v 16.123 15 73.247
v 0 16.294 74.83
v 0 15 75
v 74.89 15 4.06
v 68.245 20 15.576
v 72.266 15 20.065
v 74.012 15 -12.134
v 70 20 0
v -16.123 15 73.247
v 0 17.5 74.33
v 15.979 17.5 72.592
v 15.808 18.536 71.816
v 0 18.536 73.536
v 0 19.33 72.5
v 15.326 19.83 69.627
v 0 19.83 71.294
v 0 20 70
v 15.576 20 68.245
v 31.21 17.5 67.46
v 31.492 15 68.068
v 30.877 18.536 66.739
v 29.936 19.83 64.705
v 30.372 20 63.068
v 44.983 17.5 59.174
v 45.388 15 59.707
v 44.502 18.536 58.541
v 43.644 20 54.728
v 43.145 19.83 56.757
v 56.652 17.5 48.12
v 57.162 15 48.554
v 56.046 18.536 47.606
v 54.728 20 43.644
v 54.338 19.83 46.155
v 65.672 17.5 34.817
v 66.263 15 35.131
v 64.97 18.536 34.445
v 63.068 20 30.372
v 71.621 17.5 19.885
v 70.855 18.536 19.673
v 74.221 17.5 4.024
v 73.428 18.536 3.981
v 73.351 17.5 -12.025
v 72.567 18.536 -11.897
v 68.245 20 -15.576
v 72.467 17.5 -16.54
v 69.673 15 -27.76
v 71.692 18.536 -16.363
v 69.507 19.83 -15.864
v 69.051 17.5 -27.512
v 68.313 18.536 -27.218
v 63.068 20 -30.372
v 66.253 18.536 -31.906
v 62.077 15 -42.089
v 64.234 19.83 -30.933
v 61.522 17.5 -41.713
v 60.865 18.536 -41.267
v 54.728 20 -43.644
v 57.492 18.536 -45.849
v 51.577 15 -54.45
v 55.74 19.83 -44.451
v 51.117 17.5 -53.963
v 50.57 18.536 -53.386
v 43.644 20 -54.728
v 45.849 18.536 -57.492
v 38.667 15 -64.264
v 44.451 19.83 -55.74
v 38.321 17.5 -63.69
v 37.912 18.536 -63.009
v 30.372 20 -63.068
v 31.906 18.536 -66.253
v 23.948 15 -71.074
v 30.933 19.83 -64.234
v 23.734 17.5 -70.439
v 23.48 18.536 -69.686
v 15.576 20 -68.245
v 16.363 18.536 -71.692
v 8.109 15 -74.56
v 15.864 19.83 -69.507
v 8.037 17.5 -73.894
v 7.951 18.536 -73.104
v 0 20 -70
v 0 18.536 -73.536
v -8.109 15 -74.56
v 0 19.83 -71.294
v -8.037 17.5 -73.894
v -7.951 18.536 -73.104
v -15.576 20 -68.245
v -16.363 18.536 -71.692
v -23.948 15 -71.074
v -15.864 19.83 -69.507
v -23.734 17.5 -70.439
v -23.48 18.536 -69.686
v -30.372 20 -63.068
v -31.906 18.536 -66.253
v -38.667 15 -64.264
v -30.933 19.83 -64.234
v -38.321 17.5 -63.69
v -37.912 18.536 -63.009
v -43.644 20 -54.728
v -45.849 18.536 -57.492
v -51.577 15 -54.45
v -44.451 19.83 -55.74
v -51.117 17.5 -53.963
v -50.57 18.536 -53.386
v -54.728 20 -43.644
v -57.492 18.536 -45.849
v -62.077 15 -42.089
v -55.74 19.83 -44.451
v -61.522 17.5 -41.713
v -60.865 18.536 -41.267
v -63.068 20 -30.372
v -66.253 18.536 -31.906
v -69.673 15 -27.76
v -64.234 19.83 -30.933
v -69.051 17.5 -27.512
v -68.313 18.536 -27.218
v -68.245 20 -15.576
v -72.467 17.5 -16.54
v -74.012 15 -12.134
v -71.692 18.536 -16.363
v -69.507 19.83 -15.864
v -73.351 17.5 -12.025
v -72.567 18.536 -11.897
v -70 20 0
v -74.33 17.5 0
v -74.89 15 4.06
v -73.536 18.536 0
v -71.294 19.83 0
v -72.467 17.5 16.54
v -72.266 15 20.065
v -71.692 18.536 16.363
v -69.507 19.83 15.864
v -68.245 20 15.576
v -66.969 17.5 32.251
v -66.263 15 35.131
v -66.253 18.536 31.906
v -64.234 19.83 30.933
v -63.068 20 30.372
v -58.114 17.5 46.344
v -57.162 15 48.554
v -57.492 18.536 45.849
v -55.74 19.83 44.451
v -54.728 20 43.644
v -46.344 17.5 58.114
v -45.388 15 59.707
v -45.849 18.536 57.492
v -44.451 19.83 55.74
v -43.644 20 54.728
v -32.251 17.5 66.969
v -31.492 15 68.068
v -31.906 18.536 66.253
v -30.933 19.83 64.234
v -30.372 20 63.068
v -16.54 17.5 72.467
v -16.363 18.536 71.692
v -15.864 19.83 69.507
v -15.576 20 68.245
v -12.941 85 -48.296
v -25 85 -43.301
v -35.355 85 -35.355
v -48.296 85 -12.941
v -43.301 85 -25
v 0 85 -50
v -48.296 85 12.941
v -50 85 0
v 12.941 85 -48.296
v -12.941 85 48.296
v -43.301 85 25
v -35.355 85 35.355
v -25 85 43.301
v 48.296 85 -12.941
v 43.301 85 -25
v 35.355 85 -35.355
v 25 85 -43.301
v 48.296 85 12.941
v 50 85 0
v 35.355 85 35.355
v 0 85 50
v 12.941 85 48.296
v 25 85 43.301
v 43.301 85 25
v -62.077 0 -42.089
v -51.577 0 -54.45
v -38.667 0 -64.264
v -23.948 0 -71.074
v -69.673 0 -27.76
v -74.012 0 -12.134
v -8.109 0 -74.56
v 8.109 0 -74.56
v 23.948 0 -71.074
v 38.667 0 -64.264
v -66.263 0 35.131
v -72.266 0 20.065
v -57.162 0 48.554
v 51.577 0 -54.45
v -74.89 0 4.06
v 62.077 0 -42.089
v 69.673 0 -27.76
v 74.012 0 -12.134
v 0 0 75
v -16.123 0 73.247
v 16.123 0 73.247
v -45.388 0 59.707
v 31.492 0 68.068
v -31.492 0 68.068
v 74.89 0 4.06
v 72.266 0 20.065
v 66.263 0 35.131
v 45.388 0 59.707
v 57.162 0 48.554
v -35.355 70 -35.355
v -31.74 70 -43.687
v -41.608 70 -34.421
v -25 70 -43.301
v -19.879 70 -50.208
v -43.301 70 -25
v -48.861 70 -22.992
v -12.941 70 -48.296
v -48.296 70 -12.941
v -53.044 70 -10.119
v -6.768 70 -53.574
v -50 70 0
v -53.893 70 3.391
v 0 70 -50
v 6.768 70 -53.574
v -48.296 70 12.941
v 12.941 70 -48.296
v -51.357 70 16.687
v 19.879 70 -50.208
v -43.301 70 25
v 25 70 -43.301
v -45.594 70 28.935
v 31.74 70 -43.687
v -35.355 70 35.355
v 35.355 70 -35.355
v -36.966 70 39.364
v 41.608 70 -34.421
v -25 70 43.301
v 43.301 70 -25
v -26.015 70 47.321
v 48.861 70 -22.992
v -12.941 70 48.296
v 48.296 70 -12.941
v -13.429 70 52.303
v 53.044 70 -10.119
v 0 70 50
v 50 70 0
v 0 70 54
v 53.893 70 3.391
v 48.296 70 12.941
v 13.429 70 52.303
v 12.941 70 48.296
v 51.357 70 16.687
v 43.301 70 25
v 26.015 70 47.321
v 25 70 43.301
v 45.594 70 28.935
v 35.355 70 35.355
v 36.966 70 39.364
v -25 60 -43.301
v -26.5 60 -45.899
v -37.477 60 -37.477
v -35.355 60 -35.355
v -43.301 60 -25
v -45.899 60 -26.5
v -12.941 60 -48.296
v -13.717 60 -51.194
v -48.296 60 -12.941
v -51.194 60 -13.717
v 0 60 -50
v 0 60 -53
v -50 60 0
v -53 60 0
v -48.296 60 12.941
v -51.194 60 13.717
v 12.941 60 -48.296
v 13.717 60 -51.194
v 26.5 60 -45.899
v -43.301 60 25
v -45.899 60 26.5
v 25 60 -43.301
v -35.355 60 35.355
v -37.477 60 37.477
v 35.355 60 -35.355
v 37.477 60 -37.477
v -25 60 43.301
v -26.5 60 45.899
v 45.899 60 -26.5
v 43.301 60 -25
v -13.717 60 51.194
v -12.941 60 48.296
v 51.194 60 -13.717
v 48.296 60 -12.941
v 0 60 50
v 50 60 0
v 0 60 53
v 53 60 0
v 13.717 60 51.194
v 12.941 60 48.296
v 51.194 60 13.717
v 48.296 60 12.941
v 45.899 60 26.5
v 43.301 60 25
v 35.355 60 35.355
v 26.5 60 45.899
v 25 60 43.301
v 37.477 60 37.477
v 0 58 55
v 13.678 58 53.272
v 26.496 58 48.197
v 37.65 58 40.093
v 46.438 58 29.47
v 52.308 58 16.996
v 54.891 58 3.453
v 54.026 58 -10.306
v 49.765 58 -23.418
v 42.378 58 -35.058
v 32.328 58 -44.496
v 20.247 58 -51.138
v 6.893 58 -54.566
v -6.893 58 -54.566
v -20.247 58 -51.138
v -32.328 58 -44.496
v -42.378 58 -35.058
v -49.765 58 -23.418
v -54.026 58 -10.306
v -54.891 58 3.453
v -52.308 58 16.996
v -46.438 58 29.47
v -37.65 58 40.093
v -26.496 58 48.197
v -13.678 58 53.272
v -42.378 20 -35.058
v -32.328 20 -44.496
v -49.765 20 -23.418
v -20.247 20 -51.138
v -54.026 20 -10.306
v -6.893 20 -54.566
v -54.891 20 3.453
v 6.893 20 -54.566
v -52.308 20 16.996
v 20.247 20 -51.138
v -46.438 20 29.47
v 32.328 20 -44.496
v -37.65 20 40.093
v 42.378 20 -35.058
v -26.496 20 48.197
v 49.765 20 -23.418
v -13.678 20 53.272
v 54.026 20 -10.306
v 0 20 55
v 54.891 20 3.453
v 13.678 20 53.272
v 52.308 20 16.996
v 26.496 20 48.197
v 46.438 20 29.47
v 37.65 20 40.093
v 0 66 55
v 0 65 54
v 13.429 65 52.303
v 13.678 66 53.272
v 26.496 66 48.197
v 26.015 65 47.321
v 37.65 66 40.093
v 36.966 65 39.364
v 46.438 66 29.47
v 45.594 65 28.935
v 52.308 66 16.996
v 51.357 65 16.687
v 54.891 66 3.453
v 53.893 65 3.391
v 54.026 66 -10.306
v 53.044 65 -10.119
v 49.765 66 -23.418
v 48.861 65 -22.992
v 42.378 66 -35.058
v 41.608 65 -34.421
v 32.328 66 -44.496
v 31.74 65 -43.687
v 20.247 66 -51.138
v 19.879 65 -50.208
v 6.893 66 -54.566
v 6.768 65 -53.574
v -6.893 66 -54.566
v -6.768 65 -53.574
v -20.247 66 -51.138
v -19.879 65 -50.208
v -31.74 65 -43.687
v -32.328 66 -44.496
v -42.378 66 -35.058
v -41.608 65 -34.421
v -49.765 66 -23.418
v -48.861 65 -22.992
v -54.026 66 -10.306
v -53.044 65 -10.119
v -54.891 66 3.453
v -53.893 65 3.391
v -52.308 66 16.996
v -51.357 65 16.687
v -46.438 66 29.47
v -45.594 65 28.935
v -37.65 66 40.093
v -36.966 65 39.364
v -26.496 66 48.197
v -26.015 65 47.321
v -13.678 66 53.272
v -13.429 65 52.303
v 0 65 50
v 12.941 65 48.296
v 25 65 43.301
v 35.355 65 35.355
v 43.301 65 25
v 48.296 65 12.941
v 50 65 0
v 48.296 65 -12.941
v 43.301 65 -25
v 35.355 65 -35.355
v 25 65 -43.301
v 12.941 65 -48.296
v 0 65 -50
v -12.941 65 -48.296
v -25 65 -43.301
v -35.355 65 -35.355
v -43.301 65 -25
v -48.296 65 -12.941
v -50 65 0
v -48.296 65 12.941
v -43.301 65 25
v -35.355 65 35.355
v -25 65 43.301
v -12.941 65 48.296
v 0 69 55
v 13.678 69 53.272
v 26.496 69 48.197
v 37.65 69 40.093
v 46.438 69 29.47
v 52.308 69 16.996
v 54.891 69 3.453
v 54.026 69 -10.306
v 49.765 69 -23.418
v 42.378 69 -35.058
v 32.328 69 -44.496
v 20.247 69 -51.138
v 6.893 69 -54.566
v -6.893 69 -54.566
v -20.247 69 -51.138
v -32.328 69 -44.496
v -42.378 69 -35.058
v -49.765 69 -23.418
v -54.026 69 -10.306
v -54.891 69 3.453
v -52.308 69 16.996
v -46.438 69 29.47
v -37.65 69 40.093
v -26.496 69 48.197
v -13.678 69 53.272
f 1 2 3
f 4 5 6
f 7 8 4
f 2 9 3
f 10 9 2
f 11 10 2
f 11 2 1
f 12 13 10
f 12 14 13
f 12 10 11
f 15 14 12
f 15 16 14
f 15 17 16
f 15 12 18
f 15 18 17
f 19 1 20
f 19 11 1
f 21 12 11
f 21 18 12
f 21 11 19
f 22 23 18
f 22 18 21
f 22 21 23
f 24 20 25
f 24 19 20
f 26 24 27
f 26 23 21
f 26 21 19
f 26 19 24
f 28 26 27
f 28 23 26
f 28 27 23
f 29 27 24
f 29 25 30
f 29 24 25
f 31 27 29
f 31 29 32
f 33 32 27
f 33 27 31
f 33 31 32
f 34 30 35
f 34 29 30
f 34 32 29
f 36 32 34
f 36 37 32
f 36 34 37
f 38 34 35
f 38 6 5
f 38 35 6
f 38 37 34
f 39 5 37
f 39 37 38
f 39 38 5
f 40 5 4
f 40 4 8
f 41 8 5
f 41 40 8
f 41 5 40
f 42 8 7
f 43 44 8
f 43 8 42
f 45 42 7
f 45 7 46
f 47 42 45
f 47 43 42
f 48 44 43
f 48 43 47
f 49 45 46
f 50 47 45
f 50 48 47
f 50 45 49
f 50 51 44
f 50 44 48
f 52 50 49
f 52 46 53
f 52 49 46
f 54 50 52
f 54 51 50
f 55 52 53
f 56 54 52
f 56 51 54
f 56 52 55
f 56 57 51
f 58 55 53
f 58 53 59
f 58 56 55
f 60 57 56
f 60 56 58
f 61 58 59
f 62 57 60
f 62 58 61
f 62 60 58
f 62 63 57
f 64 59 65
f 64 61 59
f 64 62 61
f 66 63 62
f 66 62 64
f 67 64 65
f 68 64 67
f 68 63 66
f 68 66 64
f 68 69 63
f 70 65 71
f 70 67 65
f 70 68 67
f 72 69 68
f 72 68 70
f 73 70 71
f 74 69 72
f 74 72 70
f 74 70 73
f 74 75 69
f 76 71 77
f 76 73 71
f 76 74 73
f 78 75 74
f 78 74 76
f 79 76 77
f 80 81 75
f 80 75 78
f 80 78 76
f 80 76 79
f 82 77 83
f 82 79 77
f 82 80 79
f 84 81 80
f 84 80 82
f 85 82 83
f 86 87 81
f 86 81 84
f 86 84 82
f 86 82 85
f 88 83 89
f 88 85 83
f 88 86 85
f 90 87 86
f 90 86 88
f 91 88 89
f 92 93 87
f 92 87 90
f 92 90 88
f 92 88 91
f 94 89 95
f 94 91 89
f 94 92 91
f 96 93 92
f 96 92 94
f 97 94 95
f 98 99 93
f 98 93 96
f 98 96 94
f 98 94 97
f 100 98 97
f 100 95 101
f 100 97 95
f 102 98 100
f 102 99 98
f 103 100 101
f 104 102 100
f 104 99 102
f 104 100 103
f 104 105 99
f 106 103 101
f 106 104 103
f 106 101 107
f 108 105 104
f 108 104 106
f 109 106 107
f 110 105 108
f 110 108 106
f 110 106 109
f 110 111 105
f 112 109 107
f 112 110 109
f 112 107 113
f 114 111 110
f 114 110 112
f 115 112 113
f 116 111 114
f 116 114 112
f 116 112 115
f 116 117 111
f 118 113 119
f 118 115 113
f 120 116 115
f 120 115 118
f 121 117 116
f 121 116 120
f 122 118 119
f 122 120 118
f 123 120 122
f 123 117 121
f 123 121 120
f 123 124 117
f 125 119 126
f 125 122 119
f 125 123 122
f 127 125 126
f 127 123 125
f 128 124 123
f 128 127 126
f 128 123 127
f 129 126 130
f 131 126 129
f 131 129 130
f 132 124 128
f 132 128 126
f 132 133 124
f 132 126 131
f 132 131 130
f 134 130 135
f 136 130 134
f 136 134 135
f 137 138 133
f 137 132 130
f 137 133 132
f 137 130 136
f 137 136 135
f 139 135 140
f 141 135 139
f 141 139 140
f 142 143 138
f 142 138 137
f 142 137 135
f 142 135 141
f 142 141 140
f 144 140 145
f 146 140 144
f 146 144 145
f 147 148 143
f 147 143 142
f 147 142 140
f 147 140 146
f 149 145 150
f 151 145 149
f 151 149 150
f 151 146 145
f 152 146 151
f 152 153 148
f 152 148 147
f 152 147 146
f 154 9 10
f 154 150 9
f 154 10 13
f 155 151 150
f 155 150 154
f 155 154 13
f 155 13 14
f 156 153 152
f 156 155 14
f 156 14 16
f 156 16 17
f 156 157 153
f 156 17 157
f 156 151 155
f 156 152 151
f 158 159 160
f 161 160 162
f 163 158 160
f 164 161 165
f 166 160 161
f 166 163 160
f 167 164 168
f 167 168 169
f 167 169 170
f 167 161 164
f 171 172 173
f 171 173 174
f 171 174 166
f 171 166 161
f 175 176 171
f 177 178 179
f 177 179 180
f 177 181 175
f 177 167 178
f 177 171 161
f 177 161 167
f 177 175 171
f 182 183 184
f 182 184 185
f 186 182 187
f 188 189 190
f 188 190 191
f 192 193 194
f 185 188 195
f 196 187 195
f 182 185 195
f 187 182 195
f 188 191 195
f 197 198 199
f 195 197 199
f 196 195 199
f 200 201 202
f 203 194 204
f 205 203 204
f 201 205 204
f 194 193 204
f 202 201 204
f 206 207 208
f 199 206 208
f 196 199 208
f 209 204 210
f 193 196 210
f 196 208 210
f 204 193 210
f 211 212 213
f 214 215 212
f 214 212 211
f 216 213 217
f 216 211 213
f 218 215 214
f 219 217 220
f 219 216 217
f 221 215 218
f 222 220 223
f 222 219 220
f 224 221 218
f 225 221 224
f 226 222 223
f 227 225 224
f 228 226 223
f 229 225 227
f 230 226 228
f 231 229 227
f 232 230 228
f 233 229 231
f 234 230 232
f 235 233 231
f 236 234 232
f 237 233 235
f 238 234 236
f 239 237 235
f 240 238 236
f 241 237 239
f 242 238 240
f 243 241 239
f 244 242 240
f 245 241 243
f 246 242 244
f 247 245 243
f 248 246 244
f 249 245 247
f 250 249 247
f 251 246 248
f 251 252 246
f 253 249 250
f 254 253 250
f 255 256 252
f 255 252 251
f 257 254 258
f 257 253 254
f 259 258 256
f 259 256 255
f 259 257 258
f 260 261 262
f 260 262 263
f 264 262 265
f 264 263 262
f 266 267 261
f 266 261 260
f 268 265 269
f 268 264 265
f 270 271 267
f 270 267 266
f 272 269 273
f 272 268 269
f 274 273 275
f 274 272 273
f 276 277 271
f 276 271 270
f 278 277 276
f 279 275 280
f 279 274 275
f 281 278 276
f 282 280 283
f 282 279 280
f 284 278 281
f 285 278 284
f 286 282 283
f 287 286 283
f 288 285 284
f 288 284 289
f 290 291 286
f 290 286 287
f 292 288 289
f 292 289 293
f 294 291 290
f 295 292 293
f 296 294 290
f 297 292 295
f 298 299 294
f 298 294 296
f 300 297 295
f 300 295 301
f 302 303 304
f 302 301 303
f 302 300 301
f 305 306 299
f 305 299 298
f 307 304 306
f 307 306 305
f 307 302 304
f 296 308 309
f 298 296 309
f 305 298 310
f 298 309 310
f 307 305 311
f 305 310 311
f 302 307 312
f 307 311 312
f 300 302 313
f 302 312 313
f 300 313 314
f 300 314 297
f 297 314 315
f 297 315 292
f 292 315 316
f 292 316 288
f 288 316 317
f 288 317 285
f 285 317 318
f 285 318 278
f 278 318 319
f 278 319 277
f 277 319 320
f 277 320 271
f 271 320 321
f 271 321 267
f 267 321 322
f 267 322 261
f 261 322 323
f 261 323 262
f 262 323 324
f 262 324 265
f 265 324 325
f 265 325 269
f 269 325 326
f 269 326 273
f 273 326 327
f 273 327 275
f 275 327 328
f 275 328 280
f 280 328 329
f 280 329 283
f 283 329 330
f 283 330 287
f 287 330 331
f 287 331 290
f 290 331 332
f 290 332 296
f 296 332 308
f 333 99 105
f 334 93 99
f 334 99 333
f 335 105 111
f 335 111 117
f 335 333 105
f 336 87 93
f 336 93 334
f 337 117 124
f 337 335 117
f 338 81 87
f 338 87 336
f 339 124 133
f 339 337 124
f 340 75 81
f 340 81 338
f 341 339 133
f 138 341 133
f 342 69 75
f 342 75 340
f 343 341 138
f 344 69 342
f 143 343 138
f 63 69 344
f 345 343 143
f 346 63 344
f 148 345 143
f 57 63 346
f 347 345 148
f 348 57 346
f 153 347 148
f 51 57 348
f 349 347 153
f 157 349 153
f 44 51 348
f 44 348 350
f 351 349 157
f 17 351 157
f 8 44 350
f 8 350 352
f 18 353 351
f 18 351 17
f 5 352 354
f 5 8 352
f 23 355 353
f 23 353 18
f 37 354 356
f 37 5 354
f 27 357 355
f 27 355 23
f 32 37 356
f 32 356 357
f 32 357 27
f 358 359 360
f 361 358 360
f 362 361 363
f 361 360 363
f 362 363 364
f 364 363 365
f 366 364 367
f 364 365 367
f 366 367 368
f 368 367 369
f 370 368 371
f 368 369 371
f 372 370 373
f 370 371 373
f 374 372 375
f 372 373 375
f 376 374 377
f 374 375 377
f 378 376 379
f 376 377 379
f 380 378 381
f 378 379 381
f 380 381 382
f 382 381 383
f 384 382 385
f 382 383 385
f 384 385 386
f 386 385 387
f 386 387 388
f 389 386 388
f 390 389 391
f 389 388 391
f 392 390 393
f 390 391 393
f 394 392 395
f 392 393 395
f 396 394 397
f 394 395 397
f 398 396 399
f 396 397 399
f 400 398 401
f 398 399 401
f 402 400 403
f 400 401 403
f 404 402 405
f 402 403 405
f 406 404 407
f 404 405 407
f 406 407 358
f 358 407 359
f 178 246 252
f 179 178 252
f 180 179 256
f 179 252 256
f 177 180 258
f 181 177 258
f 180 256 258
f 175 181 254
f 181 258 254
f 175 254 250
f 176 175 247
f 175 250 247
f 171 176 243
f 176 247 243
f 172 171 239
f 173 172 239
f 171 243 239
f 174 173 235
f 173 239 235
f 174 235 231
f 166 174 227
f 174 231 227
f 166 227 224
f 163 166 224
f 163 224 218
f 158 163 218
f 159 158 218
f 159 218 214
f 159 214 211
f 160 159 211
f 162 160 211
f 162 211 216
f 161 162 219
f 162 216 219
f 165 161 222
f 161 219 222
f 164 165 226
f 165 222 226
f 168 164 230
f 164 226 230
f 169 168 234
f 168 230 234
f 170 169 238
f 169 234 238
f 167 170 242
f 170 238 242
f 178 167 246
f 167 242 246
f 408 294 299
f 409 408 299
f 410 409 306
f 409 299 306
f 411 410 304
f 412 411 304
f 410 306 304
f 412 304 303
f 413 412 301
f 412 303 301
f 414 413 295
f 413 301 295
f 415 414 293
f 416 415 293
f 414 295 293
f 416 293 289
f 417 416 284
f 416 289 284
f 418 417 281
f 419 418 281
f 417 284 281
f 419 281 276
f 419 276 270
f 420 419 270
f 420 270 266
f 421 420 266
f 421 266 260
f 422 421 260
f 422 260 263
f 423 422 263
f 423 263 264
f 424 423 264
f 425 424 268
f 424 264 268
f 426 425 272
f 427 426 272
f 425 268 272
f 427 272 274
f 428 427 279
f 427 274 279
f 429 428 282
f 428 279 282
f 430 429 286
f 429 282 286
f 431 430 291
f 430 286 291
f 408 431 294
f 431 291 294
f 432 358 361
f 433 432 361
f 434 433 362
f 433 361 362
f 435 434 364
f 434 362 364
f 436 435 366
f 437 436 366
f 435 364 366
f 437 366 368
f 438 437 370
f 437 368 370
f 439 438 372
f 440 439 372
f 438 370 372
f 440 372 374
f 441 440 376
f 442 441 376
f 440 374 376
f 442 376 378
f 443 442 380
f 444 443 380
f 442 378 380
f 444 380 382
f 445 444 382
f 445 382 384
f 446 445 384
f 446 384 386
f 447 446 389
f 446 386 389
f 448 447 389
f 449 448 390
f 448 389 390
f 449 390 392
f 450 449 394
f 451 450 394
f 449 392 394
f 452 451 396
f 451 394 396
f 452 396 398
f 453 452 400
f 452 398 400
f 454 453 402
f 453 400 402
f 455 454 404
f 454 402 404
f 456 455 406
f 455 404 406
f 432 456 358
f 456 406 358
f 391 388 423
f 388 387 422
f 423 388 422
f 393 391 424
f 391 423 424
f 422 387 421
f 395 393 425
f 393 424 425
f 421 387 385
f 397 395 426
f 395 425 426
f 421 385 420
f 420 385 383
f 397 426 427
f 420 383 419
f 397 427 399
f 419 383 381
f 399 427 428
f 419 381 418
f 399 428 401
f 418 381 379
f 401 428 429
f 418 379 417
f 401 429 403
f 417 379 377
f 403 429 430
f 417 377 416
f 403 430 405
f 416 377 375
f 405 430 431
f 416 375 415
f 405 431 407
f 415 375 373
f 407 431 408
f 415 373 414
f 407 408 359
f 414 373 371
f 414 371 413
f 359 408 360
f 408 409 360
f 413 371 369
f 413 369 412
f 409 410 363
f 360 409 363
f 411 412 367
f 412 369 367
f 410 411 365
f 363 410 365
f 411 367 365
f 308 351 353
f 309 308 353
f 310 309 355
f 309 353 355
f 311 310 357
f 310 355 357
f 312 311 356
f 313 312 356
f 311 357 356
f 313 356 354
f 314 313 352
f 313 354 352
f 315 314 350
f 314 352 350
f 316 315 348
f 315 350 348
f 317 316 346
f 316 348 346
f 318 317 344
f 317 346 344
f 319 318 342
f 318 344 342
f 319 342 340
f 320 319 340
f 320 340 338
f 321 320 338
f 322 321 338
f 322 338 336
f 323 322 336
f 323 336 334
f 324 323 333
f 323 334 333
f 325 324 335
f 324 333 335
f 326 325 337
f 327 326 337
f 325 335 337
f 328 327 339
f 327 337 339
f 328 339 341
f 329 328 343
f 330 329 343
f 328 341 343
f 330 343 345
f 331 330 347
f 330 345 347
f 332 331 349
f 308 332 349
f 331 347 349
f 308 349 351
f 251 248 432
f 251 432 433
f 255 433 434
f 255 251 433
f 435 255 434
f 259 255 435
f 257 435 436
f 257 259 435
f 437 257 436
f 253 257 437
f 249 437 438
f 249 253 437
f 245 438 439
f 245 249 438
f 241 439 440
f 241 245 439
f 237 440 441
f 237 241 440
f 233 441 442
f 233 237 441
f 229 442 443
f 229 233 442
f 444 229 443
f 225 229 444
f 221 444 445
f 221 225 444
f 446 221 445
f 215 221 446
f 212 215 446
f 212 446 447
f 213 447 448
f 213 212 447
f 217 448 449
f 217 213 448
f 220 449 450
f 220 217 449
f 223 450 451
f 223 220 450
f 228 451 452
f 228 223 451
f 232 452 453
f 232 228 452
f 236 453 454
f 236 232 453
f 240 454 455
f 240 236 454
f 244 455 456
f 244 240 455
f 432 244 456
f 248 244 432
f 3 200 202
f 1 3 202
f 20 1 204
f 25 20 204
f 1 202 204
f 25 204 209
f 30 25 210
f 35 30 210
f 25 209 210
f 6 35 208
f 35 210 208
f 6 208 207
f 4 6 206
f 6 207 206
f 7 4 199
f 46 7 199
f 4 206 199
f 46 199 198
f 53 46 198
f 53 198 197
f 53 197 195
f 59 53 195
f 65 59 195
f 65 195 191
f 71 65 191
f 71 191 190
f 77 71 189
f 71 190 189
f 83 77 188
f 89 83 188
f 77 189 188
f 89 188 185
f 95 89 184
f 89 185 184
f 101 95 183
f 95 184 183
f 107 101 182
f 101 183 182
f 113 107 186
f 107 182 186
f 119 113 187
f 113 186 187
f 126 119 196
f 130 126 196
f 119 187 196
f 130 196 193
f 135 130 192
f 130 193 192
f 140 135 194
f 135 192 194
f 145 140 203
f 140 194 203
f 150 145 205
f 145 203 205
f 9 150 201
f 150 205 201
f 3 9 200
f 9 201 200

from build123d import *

# Parameters (mm, degrees)
SKETCH2_R           = 75
BOSS_EXTRUDE1_DEPTH = 20
FILLET1_R           = 5
SKETCH6_R           = 55
BOSS_EXTRUDE4_DEPTH = 40
SKETCH7_R           = 50
BOSS_EXTRUDE5_DEPTH = 5
SKETCH8_R           = 55
BOSS_EXTRUDE7_DEPTH = 5
SKETCH10_R          = 50
BOSS_EXTRUDE8_DEPTH = 15
CHAMFER7_SIZE       = 1
CHAMFER8_SIZE       = 2


with BuildPart() as part:
    # Sketch2 → Boss-Extrude1 (new body)
    with BuildSketch(Plane(origin=(0, 0, 0), x_dir=(1, 0, 0), z_dir=(0, 1, 0))):
        with Locations(Location((0, 0, 0), (0, 0, 270))):
            Circle(SKETCH2_R)
    extrude(amount=BOSS_EXTRUDE1_DEPTH)

    # Fillet1
    fillet1_edges = [part.edges().sort_by_distance(p)[0] for p in [
        (0, 20, -75),
    ]]
    fillet(fillet1_edges, radius=FILLET1_R)

    # Sketch6 → Boss-Extrude4 (add)
    with BuildSketch(Plane(origin=(0, 20, 0), x_dir=(1, 0, 0), z_dir=(0, 1, 0))):
        with Locations(Location((0, 0, 0), (0, 0, 270))):
            Circle(SKETCH6_R)
    extrude(amount=BOSS_EXTRUDE4_DEPTH)

    # Sketch7 → Boss-Extrude5 (add)
    with BuildSketch(Plane(origin=(0, 60, 0), x_dir=(1, 0, 0), z_dir=(0, 1, 0))):
        with Locations(Location((0, 0, 0), (0, 0, 270))):
            Circle(SKETCH7_R)
    extrude(amount=BOSS_EXTRUDE5_DEPTH)

    # Sketch8 → Boss-Extrude7 (add)
    with BuildSketch(Plane(origin=(0, 65, 0), x_dir=(1, 0, 0), z_dir=(0, 1, 0))):
        with Locations(Location((0, 0, 0), (0, 0, 270))):
            Circle(SKETCH8_R)
    extrude(amount=BOSS_EXTRUDE7_DEPTH)

    # Sketch10 → Boss-Extrude8 (add)
    with BuildSketch(Plane(origin=(0, 70, 0), x_dir=(1, 0, 0), z_dir=(0, 1, 0))):
        with Locations(Location((0, 0, 0), (0, 0, 270))):
            Circle(SKETCH10_R)
    extrude(amount=BOSS_EXTRUDE8_DEPTH)

    # Chamfer7
    chamfer7_edges = [part.edges().sort_by_distance(p)[0] for p in [
        (0, 65, -55),
        (0, 70, -55),
    ]]
    chamfer(chamfer7_edges, length=CHAMFER7_SIZE)

    # Chamfer8
    chamfer8_edges = [part.edges().sort_by_distance(p)[0] for p in [
        (0, 60, -55),
    ]]
    chamfer(chamfer8_edges, length=CHAMFER8_SIZE)


solid = part.part
